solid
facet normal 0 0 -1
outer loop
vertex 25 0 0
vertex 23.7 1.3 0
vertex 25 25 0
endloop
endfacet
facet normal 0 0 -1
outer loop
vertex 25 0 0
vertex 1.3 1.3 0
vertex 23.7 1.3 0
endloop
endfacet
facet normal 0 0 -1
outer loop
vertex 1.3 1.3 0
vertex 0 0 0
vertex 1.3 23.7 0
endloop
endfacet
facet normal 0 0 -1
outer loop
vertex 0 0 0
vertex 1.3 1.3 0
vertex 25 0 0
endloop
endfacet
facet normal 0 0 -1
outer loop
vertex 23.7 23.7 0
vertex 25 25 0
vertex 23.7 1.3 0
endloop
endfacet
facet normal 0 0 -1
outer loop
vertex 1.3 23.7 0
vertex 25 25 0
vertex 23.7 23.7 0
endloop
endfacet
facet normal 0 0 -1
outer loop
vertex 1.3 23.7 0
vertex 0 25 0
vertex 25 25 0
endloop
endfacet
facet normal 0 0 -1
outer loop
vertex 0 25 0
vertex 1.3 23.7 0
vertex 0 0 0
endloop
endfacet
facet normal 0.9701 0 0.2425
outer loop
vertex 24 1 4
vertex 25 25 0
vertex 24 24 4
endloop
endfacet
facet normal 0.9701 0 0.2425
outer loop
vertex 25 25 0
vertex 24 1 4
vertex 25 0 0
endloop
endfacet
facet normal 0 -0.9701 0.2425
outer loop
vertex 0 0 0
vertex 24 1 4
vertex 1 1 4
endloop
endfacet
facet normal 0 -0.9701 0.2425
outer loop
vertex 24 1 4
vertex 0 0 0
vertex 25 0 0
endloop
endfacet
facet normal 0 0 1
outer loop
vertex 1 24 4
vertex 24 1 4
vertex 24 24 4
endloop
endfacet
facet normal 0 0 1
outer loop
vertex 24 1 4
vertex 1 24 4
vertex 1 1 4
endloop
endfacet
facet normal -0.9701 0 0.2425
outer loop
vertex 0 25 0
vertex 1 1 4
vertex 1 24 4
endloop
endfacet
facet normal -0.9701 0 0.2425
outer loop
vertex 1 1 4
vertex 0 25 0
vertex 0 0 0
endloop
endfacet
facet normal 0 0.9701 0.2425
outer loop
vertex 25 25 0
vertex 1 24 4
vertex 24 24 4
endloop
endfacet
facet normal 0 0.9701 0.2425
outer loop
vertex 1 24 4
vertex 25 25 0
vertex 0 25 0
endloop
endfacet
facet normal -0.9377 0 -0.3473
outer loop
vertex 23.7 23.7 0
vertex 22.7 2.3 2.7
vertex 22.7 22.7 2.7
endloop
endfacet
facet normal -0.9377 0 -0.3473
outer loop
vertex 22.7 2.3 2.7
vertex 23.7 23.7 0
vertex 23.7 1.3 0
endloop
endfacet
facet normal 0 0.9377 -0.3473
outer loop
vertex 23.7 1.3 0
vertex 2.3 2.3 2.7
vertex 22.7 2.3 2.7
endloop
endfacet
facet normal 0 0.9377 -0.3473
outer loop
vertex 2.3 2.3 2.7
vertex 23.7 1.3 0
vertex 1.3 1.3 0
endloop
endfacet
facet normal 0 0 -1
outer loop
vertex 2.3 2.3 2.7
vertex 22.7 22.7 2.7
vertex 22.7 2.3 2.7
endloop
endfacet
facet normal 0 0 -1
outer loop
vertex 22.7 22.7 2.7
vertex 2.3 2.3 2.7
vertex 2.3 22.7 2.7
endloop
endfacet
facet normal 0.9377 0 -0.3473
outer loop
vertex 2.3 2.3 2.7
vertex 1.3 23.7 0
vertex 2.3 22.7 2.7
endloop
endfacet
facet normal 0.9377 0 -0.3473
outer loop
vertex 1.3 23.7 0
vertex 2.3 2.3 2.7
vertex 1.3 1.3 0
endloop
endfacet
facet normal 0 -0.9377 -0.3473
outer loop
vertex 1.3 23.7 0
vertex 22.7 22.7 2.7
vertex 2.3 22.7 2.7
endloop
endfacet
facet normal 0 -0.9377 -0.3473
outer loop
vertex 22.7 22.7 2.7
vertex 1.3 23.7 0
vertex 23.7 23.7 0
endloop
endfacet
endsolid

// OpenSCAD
// Copyright 2023 Stefano Linguerri
//
// Licensed under the Apache License, Version 2.0 (the "License");
// you may not use this file except in compliance with the License.
// You may obtain a copy of the License at
// http://www.apache.org/licenses/LICENSE-2.0
//
// Unless required by applicable law or agreed to in writing, software
// distributed under the License is distributed on an "AS IS" BASIS,
// WITHOUT WARRANTIES OR CONDITIONS OF ANY KIND, either express or implied.¢
// See the License for the specific language governing permissions and
// limitations under the License.

//height (thickness) of this tray
height = 4;
//base width 
base_width = 25;
//base length 
base_length = 25;
//thickness of the top and sides of the base
height_offset = 1.3;
//Inset of the top of the tray: greater the value greater the slope of the tray
inset = 1;

//magnets height (if greater than 0.1 will generate the magnet holders)
magnets_height = 0.1;
//magnets diameter
magnets_diameter = 0.1;

module tray(offset, height, base_width, base_length, inset) {
    
        
        b_total_cols = (base_width);
        b_total_rows = (base_length);
        
        t_total_cols = (base_width - inset *2);
        t_total_rows = (base_length - inset *2);
        translate(
            [offset,
            offset,
            0]
        )
         polyhedron(
            points=[
                    [0,0,0],                        //base bottom left
                    [b_total_cols,0,0],             //base bottom right
                    [b_total_cols,b_total_rows,0],  //base top right
                    [0,b_total_rows,0],             //base top left
        

                    [inset,  inset,   height],                              //surface bottom left
                    [inset + t_total_cols, inset,  height],                 //surface bottom right
                    [inset + t_total_cols, inset + t_total_rows, height],   //surface top right
                    [inset,   inset + t_total_rows,  height]                //surface top left
                ],
            faces =[
                        [0,1,2,3],
                        [4,5,1,0],
                        [5,6,2,1],
                        [6,7,3,2],
                        [7,4,0,3],
                        [7,6,5,4]
                    ]
        ); 
   
}

module magnets_holes (base_width, base_length, magnets_height, magnets_diameter) {
    

            translate( 
                        [base_width/2,
                        base_length/2, 
                        0]
            )
            cylinder(d = magnets_diameter, h = magnets_height+0.01,$fn=30);

}

difference(){        
         color ([0.5, 0.5, 0.5]) {
             tray(0, height, base_width, base_length, inset);
         }


        color ([0.7, 0.7, 0.7]) {            
           
            tray(height_offset, height - height_offset, base_width - (2*height_offset), base_length - (2 * height_offset), inset);
        } 
}

if (magnets_height > 0.1){
     difference() {
        magnets_holes (base_width, base_length, height - 0.1, magnets_diameter + (2 * height_offset));        
        magnets_holes (base_width, base_length, magnets_height, magnets_diameter);        
    }
}
